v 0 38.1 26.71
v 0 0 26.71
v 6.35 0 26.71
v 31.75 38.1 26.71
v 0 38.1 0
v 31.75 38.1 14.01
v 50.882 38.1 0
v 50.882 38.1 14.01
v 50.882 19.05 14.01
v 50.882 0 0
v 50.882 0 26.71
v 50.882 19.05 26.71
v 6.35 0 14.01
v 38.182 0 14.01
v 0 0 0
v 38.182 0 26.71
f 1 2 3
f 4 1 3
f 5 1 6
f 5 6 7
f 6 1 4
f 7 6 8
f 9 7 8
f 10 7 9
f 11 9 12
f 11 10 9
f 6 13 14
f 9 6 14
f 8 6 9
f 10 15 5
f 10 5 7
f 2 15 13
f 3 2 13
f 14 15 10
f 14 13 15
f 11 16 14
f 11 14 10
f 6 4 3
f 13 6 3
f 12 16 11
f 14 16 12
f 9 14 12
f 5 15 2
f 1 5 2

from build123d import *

# Parameters (mm, degrees)
F0_W     = 50.882496
F0_H     = 26.710287
F1_DEPTH = 38.1
F3_DEPTH = 12.7


with BuildPart() as f1:
    # F0 (on Front) → F1 (new body)
    with BuildSketch(Plane.XZ):
        with Locations((25.441248, 13.355143)):
            Rectangle(F0_W, F0_H)
    extrude(amount=-F1_DEPTH)

    # F2 (on face) → F3 (cut)
    with BuildSketch(Plane.XY.offset(26.710287)):
        Polygon((31.75, 38.1), (6.35, 0), (38.182496, 0), (50.882496, 19.05), (50.882496, 38.1), align=None)
    extrude(amount=-F3_DEPTH, mode=Mode.SUBTRACT)


solid = f1.part
